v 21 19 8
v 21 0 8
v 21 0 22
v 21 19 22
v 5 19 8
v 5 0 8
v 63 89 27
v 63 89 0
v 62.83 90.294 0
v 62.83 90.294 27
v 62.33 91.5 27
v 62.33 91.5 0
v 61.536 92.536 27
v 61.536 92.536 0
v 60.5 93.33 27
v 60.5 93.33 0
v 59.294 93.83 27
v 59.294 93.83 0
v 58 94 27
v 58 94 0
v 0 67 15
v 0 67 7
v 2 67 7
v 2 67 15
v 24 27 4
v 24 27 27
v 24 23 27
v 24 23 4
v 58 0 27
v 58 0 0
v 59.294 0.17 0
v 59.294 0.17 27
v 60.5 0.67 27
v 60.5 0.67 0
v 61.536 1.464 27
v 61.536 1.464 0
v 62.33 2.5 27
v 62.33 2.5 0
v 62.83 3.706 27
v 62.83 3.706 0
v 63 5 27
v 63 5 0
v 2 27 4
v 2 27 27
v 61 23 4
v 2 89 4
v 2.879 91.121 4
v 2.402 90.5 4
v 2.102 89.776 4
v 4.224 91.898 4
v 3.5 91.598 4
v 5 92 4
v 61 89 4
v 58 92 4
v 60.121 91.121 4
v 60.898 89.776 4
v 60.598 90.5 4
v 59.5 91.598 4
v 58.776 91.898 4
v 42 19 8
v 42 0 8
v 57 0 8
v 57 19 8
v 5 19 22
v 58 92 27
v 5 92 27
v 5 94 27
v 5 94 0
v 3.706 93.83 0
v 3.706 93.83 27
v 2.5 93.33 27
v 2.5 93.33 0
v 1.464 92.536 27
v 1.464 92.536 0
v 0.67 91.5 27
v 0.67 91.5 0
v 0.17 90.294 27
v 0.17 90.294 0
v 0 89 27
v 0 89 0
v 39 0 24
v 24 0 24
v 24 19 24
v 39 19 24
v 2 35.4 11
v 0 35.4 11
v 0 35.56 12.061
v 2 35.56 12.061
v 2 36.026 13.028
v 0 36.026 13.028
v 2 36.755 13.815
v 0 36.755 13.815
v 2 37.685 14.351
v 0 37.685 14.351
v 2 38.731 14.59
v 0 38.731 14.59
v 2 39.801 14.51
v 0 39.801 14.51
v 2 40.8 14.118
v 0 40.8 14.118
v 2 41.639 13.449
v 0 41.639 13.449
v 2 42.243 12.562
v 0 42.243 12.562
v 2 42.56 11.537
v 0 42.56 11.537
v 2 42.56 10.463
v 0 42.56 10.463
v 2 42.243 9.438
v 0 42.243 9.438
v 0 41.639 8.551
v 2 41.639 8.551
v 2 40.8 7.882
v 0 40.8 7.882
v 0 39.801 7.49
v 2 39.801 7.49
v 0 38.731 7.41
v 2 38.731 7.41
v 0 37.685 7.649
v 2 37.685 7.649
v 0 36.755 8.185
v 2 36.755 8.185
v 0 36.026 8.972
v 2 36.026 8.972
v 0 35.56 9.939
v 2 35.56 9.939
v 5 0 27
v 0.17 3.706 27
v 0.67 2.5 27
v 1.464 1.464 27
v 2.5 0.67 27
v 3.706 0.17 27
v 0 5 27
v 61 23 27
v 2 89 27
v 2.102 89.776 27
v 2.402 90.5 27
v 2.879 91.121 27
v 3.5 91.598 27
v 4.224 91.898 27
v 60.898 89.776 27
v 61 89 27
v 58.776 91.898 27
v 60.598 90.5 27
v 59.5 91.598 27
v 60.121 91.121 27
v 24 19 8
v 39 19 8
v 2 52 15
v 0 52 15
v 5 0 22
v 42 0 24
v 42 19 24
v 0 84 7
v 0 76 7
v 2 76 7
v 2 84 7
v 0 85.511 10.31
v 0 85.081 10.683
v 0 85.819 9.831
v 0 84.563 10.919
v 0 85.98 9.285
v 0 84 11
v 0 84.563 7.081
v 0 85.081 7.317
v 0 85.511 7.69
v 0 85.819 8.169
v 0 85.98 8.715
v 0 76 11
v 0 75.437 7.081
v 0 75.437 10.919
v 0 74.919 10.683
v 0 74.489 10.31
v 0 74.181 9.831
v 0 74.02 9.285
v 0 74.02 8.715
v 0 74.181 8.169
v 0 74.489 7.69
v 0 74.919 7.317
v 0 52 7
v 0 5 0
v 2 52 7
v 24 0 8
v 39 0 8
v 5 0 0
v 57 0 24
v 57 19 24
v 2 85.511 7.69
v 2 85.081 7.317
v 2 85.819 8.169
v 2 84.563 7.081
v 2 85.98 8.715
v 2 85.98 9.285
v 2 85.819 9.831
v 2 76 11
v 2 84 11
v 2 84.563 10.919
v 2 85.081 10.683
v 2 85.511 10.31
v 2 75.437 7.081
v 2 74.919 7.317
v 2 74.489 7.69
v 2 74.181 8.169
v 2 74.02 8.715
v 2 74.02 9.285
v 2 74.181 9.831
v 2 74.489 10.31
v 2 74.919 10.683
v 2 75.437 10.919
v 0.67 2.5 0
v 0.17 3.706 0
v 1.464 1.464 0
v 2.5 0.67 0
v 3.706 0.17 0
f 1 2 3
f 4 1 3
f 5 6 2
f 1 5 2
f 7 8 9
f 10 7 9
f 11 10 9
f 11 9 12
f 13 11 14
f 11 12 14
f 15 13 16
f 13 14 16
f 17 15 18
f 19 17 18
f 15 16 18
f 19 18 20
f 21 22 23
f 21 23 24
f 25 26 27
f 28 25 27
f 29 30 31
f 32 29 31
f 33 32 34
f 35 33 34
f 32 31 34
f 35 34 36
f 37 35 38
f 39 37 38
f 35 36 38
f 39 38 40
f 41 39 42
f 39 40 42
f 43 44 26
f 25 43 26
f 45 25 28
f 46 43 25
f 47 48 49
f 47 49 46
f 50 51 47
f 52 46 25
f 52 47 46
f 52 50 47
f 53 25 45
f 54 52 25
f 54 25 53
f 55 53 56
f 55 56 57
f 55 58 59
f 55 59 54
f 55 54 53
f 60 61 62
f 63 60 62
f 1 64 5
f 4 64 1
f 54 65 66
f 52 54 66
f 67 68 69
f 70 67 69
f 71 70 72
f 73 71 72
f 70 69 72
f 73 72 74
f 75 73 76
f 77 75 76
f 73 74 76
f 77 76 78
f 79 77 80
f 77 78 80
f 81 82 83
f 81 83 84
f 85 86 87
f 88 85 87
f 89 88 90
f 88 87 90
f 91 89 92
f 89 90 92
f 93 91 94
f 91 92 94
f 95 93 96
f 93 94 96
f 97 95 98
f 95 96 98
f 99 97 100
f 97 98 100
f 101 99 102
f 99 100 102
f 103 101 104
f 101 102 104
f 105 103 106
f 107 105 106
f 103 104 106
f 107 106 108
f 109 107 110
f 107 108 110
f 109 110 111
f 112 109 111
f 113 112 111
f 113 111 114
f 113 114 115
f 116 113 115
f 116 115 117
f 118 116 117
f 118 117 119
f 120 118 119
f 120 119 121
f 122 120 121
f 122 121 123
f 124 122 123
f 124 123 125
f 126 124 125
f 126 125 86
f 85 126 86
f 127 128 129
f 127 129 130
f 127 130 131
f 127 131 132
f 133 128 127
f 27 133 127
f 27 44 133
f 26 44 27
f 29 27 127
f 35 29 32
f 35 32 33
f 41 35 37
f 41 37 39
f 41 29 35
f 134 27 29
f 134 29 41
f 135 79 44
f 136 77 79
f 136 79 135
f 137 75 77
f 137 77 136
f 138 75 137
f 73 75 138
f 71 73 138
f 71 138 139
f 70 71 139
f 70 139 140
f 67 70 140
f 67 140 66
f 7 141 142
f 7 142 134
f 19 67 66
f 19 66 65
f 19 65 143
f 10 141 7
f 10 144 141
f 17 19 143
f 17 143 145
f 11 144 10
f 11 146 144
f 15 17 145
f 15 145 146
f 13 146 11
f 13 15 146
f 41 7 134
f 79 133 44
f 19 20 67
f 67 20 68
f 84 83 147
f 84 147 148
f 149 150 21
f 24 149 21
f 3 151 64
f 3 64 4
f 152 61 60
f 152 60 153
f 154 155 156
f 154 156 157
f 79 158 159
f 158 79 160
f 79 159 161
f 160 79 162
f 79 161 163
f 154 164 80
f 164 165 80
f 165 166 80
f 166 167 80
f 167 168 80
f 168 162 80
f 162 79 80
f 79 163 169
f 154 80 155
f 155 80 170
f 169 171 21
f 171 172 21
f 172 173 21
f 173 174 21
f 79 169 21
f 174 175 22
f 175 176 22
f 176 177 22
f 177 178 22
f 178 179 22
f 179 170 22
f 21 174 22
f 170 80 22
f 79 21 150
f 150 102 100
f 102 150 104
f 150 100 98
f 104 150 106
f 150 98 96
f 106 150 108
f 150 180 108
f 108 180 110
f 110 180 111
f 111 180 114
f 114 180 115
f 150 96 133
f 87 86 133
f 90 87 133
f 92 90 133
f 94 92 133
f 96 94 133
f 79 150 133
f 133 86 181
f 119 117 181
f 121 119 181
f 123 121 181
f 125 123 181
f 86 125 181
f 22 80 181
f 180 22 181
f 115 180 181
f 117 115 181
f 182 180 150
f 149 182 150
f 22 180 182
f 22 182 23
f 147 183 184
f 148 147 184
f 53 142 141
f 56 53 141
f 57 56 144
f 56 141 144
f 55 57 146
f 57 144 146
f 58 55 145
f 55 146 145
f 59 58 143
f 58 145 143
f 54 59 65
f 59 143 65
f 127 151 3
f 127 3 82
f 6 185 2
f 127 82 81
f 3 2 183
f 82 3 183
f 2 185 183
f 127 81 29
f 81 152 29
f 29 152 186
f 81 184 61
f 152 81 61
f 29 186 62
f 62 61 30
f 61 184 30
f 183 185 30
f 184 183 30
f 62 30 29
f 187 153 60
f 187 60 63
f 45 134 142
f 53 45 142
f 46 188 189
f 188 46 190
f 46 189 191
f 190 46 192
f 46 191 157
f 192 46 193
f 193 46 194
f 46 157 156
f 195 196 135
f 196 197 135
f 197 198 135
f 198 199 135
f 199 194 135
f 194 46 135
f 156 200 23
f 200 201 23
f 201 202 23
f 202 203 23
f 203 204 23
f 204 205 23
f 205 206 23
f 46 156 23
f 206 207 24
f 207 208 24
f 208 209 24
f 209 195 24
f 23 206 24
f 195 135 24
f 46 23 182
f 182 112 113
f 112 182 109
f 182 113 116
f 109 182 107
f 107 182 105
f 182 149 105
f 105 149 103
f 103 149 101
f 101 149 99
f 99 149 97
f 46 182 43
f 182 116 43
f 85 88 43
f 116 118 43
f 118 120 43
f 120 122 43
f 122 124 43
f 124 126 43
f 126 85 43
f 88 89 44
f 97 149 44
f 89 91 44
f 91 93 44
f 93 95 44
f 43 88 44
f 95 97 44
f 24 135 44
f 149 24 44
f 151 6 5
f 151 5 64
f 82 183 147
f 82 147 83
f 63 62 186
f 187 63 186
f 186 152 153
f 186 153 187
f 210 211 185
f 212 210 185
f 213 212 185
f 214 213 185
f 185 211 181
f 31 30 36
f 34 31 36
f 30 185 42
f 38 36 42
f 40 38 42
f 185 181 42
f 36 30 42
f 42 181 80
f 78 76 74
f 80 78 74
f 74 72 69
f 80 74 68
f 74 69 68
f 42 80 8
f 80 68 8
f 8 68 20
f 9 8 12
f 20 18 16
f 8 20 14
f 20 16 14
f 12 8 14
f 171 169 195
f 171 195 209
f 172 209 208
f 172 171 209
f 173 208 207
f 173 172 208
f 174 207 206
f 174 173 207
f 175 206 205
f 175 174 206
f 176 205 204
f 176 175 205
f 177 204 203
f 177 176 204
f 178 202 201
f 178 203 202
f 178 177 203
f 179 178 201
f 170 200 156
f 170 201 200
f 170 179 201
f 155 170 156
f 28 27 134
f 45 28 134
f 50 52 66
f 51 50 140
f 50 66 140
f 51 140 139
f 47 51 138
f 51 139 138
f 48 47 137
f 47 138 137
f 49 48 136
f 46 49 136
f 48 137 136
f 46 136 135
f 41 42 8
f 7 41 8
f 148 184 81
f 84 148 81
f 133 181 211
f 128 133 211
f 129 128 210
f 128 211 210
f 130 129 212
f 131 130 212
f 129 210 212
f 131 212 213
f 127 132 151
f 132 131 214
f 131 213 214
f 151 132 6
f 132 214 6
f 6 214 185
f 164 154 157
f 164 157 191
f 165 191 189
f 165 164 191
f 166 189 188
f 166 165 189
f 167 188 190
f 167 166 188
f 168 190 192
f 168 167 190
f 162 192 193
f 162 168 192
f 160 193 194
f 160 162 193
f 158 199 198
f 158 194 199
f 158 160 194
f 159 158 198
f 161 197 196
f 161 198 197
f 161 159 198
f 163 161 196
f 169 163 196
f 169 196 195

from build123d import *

# Parameters (mm, degrees)
BOSS_EXTRU_1_DEPTH      = 27
ESQUISSE2_R             = 3.6
ESQUISSE2_W             = 8
ESQUISSE2_H             = 15
ENL_V_MAT_EXTRU_1_DEPTH = 9
ESQUISSE3_W             = 16
ESQUISSE3_H             = 14
ESQUISSE3_W_2           = 15
ESQUISSE3_H_2           = 16
ENL_V_MAT_EXTRU_2_DEPTH = 19
ENL_V_MAT_EXTRU_3_DEPTH = 23


with BuildPart() as part:
    # Esquisse1 → Boss.-Extru.1 (new body)
    with BuildSketch(Plane.XY):
        with BuildLine():
            Line((5, 0), (58, 0))
            ThreePointArc((58, 0), (61.535533906, 1.464466094), (63, 5))
            Line((63, 5), (63, 89))
            ThreePointArc((63, 89), (61.535533906, 92.535533906), (58, 94))
            Line((58, 94), (5, 94))
            ThreePointArc((5, 94), (1.464466094, 92.535533906), (0, 89))
            Line((0, 89), (0, 5))
            ThreePointArc((0, 5), (1.464466094, 1.464466094), (5, 0))
        make_face()
    extrude(amount=BOSS_EXTRU_1_DEPTH)

    # Esquisse2 → Enlèv. mat.-Extru.1 (cut)
    with BuildSketch(Plane.ZY):
        with Locations(Location((11, 39, 0), (0, 0, 270))):
            Circle(ESQUISSE2_R)
        with BuildLine():
            Line((11, 84), (11, 76))
            ThreePointArc((11, 76), (9, 74), (7, 76))
            Line((7, 76), (7, 84))
            ThreePointArc((7, 84), (9, 86), (11, 84))
        make_face()
        with Locations((11, 59.5)):
            Rectangle(ESQUISSE2_W, ESQUISSE2_H)
    extrude(amount=-ENL_V_MAT_EXTRU_1_DEPTH, mode=Mode.SUBTRACT)

    # Esquisse3 → Enlèv. mat.-Extru.2 (cut)
    with BuildSketch(Plane.XZ):
        with Locations((13, 15)):
            Rectangle(ESQUISSE3_W, ESQUISSE3_H)
        with Locations((31.5, 16)):
            Rectangle(ESQUISSE3_W_2, ESQUISSE3_H_2)
        with Locations((49.5, 16)):
            Rectangle(ESQUISSE3_W_2, ESQUISSE3_H_2)
    extrude(amount=-ENL_V_MAT_EXTRU_2_DEPTH, mode=Mode.SUBTRACT)

    # Esquisse4 → Enlèv. mat.-Extru.3 (cut)
    with BuildSketch(Plane.XY.offset(27)):
        with BuildLine():
            Line((2, 27), (24, 27))
            Line((24, 27), (24, 23))
            Line((24, 23), (61, 23))
            Line((61, 23), (61, 27))
            Line((61, 27), (61, 89))
            ThreePointArc((61, 89), (60.121320344, 91.121320344), (58, 92))
            Line((58, 92), (5, 92))
            ThreePointArc((5, 92), (2.878679656, 91.121320344), (2, 89))
            Line((2, 89), (2, 27))
        make_face()
    extrude(amount=-ENL_V_MAT_EXTRU_3_DEPTH, mode=Mode.SUBTRACT)


solid = part.part
